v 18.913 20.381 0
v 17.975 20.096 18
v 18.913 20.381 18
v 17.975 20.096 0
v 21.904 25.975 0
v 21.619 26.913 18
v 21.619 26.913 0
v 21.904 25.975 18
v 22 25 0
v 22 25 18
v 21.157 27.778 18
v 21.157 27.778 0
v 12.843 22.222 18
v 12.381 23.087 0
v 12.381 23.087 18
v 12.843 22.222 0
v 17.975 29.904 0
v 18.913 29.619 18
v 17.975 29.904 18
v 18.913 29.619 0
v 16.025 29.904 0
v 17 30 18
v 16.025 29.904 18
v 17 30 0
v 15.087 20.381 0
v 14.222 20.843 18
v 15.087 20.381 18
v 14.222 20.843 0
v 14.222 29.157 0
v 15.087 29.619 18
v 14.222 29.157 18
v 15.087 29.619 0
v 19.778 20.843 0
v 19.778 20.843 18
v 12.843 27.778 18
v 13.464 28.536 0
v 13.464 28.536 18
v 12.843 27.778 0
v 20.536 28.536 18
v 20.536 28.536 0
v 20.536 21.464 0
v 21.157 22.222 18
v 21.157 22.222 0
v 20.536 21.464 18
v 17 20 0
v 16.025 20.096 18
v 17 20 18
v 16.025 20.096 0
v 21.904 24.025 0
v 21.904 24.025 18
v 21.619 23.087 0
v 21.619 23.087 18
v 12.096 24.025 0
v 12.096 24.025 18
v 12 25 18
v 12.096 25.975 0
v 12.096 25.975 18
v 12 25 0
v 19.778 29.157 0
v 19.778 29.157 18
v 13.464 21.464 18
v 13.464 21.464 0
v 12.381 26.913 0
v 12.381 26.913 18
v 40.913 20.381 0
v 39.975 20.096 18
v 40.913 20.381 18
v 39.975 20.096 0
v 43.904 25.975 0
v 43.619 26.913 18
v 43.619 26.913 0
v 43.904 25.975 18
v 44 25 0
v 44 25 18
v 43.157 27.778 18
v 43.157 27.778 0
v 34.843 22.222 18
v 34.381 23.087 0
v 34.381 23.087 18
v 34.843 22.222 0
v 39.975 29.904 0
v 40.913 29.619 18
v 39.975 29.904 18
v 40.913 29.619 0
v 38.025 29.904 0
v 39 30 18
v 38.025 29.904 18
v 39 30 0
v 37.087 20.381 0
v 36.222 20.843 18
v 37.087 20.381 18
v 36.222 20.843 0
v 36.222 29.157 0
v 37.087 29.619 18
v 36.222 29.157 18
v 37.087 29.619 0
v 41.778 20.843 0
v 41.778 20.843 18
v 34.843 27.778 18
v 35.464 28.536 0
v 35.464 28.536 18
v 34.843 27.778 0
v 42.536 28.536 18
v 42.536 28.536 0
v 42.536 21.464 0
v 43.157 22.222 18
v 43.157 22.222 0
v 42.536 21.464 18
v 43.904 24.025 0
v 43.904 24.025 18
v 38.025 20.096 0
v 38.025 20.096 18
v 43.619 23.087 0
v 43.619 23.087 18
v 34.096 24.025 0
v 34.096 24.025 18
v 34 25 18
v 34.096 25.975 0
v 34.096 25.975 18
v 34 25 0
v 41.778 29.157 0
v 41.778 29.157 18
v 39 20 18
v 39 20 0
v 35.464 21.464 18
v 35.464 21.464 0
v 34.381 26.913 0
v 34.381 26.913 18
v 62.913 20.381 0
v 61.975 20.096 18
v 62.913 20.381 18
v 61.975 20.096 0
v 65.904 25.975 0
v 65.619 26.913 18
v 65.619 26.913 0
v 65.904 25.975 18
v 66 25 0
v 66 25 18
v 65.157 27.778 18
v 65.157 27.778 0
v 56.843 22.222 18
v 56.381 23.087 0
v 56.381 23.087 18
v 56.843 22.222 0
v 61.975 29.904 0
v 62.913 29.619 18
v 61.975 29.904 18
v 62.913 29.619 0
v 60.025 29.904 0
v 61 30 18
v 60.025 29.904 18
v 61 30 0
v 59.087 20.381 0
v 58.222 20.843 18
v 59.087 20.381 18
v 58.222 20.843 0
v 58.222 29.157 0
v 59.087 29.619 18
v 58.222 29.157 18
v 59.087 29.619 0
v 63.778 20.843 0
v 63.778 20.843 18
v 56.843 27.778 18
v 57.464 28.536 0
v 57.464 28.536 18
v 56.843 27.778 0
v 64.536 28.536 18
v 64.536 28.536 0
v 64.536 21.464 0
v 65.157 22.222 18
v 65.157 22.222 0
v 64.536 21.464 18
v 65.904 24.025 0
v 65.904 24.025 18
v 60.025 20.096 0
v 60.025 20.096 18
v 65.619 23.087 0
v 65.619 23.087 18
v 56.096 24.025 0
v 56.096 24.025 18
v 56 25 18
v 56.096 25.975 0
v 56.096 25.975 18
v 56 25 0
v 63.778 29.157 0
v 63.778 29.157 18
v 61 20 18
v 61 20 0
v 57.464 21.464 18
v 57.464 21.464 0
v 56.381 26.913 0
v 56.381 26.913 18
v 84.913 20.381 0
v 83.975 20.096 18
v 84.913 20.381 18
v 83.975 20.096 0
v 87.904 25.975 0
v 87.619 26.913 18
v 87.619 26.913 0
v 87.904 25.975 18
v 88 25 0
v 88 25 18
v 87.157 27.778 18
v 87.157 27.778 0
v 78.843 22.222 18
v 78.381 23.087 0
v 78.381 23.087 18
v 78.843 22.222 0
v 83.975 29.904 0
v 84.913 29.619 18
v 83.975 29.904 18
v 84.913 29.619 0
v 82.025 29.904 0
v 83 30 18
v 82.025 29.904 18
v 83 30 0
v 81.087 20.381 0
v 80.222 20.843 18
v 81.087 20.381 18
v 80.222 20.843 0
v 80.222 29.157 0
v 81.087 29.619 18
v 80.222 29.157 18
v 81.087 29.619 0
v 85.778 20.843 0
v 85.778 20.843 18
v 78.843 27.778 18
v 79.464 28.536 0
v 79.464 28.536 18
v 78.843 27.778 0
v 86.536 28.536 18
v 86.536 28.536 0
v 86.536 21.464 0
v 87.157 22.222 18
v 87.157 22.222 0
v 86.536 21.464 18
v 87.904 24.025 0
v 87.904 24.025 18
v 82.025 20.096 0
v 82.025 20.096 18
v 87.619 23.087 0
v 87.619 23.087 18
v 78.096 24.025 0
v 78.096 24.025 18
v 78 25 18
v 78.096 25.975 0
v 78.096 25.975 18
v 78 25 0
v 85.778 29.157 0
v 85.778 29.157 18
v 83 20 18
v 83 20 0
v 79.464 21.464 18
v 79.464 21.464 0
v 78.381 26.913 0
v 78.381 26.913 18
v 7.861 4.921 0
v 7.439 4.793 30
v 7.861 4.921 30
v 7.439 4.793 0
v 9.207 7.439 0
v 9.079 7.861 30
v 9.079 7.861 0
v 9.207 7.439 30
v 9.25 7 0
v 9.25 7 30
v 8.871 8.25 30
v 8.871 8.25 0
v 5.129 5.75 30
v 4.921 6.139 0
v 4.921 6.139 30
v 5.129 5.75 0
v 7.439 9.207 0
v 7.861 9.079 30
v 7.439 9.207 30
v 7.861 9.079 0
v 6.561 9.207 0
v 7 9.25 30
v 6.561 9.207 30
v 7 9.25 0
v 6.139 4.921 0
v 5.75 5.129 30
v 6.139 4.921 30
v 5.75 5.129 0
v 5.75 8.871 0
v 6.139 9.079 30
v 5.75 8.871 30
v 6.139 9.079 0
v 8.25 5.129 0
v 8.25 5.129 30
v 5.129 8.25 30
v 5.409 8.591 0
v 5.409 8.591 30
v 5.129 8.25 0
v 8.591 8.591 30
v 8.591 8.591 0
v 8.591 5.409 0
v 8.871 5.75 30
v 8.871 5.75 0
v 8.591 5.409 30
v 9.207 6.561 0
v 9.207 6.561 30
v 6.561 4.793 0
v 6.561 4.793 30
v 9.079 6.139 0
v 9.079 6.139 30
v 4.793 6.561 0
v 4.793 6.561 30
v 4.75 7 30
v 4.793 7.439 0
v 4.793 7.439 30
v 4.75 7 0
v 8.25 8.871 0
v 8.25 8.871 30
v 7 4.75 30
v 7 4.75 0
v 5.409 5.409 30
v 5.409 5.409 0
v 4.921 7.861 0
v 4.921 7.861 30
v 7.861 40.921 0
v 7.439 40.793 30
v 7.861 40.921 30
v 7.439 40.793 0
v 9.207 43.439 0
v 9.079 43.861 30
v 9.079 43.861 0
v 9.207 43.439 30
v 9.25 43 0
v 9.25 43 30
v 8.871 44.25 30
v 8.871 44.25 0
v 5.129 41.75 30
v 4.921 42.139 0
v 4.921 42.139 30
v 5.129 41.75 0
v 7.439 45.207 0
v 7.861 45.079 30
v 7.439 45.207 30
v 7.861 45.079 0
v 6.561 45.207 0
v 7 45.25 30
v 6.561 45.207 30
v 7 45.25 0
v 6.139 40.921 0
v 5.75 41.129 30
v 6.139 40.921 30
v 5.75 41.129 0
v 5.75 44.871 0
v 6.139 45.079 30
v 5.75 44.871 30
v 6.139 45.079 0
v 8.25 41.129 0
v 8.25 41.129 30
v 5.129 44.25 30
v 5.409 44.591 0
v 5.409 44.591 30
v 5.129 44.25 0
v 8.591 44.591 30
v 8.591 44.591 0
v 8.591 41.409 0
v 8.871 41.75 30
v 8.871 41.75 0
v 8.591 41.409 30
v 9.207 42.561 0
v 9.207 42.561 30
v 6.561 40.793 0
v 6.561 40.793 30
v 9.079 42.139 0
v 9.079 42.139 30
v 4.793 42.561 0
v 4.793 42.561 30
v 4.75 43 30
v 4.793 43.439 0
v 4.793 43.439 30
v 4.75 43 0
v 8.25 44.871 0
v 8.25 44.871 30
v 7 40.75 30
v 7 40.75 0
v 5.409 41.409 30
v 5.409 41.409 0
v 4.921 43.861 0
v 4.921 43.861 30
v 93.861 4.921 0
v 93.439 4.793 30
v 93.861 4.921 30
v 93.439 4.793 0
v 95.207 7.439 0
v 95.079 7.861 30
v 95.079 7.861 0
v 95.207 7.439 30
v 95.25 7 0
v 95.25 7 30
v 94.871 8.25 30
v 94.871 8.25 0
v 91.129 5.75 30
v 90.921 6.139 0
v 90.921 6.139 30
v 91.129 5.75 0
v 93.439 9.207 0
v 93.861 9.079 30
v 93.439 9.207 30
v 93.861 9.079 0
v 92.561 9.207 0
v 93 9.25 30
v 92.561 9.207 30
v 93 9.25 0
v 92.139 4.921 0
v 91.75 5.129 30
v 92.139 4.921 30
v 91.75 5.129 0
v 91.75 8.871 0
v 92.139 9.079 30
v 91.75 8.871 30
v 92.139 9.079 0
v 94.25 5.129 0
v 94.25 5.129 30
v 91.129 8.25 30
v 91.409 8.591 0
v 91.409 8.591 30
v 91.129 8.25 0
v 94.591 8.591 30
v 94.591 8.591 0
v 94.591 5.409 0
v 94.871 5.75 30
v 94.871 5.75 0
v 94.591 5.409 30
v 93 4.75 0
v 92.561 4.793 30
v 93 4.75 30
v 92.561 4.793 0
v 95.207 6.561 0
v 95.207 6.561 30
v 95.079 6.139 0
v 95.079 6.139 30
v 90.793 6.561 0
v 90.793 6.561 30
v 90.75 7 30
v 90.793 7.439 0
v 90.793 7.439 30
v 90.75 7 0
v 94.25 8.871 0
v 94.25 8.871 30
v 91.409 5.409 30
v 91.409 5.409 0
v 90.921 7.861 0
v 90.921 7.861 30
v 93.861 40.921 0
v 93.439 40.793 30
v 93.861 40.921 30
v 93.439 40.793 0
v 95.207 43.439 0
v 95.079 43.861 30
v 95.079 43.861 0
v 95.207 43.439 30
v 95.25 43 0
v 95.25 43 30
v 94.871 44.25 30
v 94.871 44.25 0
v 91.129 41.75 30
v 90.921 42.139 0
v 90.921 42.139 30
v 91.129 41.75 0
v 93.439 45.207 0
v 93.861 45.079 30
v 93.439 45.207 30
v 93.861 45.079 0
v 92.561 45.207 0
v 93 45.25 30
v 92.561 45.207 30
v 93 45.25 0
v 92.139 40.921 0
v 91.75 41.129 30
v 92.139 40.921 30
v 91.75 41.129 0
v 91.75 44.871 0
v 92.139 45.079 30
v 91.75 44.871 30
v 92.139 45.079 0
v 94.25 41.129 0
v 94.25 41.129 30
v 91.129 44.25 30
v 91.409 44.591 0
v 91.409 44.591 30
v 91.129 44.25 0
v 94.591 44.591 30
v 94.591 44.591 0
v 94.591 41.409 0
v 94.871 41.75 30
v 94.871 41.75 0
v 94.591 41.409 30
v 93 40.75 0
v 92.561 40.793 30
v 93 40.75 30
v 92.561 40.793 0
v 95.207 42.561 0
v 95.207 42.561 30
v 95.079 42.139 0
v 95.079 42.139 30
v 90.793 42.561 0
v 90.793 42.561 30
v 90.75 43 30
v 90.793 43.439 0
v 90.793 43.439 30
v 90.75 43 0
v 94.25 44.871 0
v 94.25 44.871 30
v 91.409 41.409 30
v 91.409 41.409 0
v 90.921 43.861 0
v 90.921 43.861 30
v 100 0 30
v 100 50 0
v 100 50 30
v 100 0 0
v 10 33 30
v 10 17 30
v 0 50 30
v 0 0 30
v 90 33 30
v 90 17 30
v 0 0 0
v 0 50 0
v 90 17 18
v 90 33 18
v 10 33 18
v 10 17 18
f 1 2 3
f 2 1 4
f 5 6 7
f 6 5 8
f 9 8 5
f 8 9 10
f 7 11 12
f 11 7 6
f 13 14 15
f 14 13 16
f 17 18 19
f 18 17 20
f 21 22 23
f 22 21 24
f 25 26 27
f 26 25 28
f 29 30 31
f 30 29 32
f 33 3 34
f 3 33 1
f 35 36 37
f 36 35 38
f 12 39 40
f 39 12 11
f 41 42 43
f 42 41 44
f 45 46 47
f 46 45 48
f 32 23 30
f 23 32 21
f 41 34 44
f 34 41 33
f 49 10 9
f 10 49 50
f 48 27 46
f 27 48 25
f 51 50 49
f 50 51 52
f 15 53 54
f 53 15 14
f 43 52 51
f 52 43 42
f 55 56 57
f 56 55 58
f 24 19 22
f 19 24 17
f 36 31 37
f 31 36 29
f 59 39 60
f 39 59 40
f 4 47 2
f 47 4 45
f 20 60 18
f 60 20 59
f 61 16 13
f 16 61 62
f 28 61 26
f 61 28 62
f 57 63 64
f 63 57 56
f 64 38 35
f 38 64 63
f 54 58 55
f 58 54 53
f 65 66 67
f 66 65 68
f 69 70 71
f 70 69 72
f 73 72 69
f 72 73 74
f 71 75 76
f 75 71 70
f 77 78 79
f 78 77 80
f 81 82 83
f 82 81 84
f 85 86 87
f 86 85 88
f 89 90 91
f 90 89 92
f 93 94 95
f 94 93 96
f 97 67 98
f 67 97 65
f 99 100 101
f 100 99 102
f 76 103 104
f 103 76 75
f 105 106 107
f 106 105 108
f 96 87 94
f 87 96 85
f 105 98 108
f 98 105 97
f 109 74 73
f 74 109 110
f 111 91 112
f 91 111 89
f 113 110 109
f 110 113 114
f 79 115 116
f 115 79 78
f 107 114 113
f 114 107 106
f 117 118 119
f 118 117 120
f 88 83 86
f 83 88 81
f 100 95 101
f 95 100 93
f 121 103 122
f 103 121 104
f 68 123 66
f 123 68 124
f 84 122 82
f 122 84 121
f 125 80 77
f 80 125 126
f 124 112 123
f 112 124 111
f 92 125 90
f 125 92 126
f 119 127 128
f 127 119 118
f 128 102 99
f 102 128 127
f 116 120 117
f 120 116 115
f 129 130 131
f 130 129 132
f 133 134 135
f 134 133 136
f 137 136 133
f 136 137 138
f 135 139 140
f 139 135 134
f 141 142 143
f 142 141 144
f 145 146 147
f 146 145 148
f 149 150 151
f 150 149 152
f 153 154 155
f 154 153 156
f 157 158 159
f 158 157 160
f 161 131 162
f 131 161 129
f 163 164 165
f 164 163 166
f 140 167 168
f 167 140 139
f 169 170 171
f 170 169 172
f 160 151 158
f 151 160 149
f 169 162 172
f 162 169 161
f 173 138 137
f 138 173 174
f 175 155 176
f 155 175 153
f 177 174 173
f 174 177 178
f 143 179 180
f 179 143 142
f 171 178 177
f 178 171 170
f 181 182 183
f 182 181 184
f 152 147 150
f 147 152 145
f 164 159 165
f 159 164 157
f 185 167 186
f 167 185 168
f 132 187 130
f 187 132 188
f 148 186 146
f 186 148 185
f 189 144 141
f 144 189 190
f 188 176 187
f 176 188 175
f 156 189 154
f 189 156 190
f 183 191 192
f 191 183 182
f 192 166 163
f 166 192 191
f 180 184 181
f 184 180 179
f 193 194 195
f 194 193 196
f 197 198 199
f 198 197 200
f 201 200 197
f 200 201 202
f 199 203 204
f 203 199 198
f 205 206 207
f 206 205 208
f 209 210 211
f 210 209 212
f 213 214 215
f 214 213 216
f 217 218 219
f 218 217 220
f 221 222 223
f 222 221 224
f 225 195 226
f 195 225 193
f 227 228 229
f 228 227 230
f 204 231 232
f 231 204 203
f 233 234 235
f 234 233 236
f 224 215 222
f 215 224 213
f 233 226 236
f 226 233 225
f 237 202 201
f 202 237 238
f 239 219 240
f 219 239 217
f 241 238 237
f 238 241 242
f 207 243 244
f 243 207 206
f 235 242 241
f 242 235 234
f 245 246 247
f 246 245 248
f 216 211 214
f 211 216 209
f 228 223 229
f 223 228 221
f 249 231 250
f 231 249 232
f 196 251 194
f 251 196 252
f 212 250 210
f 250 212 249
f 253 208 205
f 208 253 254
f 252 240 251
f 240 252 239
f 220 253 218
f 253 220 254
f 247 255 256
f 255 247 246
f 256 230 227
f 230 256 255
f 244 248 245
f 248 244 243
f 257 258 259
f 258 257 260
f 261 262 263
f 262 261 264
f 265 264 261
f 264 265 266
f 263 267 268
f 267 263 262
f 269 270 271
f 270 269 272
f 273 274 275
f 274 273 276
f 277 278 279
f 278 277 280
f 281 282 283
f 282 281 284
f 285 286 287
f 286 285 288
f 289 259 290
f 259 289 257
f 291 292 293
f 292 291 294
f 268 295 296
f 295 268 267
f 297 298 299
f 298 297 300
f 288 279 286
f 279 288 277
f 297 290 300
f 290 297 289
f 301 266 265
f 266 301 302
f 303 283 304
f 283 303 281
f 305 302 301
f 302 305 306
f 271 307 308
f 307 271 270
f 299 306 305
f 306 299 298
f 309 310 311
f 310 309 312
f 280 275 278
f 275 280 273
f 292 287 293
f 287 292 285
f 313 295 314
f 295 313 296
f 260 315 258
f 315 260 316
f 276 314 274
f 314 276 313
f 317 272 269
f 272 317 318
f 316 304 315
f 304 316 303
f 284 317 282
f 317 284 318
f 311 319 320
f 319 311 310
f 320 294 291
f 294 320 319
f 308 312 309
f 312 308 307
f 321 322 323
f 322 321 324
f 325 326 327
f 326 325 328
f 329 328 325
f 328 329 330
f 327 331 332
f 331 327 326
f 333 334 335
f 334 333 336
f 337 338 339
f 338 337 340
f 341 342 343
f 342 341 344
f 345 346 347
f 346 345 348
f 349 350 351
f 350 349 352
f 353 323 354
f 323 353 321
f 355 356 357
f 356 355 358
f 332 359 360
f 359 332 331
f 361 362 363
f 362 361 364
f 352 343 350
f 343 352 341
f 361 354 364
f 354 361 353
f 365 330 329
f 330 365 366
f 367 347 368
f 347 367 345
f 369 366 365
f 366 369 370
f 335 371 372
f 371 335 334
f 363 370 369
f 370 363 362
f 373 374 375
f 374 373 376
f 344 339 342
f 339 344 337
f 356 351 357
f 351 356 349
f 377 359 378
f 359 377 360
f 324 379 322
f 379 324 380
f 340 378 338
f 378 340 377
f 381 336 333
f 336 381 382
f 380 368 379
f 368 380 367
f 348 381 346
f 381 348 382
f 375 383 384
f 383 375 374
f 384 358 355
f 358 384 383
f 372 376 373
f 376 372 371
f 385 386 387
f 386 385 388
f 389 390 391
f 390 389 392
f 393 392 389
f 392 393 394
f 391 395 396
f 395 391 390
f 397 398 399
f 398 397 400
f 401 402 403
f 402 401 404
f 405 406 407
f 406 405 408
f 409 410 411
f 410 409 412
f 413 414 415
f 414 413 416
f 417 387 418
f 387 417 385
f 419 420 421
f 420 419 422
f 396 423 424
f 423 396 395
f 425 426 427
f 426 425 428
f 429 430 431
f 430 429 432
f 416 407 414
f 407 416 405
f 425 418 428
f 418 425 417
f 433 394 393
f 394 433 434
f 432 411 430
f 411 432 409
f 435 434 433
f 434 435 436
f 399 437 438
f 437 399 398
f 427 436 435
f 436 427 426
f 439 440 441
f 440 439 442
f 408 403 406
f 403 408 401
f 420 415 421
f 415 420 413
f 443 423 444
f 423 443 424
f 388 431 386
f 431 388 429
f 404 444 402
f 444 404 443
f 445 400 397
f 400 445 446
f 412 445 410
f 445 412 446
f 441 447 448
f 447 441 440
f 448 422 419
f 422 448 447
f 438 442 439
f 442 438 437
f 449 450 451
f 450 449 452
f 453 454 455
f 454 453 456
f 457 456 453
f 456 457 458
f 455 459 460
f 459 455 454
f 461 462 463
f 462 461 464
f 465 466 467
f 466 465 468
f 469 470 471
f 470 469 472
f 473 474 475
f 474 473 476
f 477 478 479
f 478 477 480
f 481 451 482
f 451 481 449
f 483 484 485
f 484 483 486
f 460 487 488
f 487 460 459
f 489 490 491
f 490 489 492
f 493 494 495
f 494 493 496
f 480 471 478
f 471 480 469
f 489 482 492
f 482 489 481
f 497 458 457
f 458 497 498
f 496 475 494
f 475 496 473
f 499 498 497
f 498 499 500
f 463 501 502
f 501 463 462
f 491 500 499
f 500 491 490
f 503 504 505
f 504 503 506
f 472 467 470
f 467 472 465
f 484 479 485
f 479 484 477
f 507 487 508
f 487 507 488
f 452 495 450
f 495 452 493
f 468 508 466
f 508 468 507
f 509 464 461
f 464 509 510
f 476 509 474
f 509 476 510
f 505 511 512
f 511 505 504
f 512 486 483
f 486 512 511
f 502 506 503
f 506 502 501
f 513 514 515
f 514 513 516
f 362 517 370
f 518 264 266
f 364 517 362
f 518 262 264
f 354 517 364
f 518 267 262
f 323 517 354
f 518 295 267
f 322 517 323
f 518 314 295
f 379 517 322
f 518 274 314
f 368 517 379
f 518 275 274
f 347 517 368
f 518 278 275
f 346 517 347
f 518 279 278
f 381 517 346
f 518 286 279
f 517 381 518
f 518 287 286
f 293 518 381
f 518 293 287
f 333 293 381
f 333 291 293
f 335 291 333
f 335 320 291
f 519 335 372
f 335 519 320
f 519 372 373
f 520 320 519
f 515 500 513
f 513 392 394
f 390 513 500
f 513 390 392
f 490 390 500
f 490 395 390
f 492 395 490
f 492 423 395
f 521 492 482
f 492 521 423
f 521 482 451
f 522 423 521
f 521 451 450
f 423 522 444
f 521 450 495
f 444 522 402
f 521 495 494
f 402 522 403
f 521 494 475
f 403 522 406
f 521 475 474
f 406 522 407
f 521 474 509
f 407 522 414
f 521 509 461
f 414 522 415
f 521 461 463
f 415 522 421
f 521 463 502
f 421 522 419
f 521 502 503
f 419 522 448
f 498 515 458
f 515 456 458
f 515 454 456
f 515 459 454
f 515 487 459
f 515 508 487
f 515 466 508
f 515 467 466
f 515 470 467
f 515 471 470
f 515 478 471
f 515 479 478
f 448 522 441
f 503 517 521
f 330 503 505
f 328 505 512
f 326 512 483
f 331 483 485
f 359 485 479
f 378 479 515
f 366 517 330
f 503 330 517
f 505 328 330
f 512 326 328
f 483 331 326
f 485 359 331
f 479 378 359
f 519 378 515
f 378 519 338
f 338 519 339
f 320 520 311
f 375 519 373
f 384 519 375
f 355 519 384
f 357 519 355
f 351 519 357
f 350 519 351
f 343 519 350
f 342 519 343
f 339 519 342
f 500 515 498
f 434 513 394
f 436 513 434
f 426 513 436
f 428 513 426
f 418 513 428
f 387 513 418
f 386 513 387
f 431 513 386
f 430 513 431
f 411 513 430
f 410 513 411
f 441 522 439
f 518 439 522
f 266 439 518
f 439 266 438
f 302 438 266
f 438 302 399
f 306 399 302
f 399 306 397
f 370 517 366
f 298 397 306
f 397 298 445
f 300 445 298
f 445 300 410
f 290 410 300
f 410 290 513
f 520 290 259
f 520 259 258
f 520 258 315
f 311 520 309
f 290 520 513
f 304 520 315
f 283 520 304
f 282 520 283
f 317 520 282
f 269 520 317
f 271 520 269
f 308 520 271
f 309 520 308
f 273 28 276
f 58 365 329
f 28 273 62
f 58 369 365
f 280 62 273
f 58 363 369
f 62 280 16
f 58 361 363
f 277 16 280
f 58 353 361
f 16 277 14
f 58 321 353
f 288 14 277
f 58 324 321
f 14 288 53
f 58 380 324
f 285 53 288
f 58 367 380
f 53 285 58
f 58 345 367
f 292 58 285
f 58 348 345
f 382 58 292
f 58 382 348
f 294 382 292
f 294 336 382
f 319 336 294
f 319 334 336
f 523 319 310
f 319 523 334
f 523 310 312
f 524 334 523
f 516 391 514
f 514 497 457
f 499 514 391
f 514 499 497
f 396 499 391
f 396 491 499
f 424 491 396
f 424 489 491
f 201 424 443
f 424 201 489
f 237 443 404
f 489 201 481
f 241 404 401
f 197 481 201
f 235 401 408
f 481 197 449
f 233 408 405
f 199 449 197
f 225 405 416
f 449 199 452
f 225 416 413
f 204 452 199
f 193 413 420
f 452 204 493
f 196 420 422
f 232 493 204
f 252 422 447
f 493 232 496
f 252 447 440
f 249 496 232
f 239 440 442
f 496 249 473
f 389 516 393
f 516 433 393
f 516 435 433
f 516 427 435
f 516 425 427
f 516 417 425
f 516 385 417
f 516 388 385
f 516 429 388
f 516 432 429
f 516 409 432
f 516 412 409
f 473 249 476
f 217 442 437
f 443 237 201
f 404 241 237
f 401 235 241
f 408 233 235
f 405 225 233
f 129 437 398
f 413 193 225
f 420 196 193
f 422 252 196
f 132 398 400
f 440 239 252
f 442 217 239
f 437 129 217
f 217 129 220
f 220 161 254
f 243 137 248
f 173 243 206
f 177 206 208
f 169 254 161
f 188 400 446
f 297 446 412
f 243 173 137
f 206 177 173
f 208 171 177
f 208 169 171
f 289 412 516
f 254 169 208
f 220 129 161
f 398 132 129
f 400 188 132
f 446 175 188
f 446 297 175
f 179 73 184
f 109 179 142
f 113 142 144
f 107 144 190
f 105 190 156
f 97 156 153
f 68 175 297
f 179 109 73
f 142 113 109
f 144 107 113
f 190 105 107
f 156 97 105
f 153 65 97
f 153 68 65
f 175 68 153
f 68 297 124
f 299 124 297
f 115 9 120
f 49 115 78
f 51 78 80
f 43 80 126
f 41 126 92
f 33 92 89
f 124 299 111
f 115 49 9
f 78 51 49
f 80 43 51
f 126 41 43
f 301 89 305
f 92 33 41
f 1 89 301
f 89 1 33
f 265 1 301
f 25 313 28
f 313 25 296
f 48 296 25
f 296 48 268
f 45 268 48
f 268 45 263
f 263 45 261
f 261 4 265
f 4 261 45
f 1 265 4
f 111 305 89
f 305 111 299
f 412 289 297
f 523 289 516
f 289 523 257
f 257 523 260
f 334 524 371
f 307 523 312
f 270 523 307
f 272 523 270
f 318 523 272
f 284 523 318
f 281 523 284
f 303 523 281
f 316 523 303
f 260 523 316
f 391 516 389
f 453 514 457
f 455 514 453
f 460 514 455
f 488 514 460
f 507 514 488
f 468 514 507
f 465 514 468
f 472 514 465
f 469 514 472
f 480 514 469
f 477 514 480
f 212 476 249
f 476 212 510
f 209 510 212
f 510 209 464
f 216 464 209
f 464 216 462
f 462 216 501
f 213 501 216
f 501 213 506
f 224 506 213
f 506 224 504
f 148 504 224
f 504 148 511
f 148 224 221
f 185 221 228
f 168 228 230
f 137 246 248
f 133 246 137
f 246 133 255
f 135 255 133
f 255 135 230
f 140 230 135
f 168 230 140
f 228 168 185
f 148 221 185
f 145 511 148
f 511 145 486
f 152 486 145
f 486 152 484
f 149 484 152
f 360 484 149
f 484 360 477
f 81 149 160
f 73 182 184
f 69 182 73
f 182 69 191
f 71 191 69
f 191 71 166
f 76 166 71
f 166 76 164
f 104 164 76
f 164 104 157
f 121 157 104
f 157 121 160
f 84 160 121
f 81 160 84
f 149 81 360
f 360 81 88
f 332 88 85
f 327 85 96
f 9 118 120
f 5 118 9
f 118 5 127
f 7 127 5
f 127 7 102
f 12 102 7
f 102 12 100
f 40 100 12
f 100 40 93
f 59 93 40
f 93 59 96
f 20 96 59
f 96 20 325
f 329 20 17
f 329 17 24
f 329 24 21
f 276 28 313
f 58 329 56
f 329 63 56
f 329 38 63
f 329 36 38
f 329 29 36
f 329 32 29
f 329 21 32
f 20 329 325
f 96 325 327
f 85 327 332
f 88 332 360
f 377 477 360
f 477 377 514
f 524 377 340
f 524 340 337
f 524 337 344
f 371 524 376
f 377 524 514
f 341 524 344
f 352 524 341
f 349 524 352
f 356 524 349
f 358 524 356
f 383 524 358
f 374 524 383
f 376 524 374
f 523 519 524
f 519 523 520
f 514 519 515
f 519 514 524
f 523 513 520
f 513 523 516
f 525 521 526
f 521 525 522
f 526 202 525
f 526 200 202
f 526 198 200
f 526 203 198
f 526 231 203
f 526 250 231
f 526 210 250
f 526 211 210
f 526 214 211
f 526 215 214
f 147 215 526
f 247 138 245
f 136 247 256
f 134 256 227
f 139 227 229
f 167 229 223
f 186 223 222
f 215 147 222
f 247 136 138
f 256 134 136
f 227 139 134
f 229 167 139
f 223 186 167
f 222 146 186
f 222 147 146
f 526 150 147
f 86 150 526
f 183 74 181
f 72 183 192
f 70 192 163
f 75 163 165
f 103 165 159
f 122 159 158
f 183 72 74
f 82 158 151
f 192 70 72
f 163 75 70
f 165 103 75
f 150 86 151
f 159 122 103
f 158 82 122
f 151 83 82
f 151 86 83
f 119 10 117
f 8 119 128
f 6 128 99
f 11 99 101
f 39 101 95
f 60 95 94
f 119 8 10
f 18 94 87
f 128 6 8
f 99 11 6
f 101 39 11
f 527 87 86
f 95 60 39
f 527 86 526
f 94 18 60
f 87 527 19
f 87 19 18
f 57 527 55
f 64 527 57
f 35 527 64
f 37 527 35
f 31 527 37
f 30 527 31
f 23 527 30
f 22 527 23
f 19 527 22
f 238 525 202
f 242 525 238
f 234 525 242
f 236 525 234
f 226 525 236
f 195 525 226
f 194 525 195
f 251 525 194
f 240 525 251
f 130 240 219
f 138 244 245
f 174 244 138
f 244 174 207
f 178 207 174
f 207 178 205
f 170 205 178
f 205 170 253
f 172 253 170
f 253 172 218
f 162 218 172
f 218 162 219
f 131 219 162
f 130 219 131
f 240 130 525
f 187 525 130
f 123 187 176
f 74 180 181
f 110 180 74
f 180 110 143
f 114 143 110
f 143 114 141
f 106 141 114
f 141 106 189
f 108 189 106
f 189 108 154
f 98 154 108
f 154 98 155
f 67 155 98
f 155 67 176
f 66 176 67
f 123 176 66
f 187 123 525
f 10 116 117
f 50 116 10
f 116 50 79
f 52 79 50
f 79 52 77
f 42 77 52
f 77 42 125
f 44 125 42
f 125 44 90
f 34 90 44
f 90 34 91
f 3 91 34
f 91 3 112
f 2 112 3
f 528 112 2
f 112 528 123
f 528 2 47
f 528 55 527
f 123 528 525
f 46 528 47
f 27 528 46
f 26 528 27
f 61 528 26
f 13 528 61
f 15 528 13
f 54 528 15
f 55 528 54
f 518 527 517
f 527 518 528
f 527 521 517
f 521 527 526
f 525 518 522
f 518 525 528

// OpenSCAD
$fn = 32;

// ----------------------------------------------------------------------
// Manifold block: gallery_top manifold
// ----------------------------------------------------------------------

// --- parameters (mm) ---
block_l = 100;            // block length, X
block_w = 50;             // block width, Y
block_h = 30;             // block height, Z
port_d = 10;              // port bore diameter
port_pitch = 22;          // port pitch along X
gallery_d = 16;           // top gallery width, Y
gallery_depth = 12;       // gallery pocket depth
wall_p = 10;              // gallery end wall thickness, X
mnt_d = 4.5;              // mounting hole diameter
mnt_in = 7;               // mounting hole inset from the edges

n_ports = 4;  // ports in the row
port_x0 = (block_l - (n_ports - 1) * port_pitch) / 2;  // first port X

difference() {
  cube([block_l, block_w, block_h]);
  for (i = [0 : n_ports - 1])
    translate([port_x0 + i * port_pitch, block_w / 2, -1])
      cylinder(h = block_h + 2, d = port_d);
  translate([wall_p, block_w / 2 - gallery_d / 2, block_h - gallery_depth])
    cube([block_l - 2 * wall_p, gallery_d, gallery_depth + 1]);
  for (cx = [mnt_in, block_l - mnt_in])
    for (cy = [mnt_in, block_w - mnt_in])
      translate([cx, cy, -1]) cylinder(h = block_h + 2, d = mnt_d);
}
